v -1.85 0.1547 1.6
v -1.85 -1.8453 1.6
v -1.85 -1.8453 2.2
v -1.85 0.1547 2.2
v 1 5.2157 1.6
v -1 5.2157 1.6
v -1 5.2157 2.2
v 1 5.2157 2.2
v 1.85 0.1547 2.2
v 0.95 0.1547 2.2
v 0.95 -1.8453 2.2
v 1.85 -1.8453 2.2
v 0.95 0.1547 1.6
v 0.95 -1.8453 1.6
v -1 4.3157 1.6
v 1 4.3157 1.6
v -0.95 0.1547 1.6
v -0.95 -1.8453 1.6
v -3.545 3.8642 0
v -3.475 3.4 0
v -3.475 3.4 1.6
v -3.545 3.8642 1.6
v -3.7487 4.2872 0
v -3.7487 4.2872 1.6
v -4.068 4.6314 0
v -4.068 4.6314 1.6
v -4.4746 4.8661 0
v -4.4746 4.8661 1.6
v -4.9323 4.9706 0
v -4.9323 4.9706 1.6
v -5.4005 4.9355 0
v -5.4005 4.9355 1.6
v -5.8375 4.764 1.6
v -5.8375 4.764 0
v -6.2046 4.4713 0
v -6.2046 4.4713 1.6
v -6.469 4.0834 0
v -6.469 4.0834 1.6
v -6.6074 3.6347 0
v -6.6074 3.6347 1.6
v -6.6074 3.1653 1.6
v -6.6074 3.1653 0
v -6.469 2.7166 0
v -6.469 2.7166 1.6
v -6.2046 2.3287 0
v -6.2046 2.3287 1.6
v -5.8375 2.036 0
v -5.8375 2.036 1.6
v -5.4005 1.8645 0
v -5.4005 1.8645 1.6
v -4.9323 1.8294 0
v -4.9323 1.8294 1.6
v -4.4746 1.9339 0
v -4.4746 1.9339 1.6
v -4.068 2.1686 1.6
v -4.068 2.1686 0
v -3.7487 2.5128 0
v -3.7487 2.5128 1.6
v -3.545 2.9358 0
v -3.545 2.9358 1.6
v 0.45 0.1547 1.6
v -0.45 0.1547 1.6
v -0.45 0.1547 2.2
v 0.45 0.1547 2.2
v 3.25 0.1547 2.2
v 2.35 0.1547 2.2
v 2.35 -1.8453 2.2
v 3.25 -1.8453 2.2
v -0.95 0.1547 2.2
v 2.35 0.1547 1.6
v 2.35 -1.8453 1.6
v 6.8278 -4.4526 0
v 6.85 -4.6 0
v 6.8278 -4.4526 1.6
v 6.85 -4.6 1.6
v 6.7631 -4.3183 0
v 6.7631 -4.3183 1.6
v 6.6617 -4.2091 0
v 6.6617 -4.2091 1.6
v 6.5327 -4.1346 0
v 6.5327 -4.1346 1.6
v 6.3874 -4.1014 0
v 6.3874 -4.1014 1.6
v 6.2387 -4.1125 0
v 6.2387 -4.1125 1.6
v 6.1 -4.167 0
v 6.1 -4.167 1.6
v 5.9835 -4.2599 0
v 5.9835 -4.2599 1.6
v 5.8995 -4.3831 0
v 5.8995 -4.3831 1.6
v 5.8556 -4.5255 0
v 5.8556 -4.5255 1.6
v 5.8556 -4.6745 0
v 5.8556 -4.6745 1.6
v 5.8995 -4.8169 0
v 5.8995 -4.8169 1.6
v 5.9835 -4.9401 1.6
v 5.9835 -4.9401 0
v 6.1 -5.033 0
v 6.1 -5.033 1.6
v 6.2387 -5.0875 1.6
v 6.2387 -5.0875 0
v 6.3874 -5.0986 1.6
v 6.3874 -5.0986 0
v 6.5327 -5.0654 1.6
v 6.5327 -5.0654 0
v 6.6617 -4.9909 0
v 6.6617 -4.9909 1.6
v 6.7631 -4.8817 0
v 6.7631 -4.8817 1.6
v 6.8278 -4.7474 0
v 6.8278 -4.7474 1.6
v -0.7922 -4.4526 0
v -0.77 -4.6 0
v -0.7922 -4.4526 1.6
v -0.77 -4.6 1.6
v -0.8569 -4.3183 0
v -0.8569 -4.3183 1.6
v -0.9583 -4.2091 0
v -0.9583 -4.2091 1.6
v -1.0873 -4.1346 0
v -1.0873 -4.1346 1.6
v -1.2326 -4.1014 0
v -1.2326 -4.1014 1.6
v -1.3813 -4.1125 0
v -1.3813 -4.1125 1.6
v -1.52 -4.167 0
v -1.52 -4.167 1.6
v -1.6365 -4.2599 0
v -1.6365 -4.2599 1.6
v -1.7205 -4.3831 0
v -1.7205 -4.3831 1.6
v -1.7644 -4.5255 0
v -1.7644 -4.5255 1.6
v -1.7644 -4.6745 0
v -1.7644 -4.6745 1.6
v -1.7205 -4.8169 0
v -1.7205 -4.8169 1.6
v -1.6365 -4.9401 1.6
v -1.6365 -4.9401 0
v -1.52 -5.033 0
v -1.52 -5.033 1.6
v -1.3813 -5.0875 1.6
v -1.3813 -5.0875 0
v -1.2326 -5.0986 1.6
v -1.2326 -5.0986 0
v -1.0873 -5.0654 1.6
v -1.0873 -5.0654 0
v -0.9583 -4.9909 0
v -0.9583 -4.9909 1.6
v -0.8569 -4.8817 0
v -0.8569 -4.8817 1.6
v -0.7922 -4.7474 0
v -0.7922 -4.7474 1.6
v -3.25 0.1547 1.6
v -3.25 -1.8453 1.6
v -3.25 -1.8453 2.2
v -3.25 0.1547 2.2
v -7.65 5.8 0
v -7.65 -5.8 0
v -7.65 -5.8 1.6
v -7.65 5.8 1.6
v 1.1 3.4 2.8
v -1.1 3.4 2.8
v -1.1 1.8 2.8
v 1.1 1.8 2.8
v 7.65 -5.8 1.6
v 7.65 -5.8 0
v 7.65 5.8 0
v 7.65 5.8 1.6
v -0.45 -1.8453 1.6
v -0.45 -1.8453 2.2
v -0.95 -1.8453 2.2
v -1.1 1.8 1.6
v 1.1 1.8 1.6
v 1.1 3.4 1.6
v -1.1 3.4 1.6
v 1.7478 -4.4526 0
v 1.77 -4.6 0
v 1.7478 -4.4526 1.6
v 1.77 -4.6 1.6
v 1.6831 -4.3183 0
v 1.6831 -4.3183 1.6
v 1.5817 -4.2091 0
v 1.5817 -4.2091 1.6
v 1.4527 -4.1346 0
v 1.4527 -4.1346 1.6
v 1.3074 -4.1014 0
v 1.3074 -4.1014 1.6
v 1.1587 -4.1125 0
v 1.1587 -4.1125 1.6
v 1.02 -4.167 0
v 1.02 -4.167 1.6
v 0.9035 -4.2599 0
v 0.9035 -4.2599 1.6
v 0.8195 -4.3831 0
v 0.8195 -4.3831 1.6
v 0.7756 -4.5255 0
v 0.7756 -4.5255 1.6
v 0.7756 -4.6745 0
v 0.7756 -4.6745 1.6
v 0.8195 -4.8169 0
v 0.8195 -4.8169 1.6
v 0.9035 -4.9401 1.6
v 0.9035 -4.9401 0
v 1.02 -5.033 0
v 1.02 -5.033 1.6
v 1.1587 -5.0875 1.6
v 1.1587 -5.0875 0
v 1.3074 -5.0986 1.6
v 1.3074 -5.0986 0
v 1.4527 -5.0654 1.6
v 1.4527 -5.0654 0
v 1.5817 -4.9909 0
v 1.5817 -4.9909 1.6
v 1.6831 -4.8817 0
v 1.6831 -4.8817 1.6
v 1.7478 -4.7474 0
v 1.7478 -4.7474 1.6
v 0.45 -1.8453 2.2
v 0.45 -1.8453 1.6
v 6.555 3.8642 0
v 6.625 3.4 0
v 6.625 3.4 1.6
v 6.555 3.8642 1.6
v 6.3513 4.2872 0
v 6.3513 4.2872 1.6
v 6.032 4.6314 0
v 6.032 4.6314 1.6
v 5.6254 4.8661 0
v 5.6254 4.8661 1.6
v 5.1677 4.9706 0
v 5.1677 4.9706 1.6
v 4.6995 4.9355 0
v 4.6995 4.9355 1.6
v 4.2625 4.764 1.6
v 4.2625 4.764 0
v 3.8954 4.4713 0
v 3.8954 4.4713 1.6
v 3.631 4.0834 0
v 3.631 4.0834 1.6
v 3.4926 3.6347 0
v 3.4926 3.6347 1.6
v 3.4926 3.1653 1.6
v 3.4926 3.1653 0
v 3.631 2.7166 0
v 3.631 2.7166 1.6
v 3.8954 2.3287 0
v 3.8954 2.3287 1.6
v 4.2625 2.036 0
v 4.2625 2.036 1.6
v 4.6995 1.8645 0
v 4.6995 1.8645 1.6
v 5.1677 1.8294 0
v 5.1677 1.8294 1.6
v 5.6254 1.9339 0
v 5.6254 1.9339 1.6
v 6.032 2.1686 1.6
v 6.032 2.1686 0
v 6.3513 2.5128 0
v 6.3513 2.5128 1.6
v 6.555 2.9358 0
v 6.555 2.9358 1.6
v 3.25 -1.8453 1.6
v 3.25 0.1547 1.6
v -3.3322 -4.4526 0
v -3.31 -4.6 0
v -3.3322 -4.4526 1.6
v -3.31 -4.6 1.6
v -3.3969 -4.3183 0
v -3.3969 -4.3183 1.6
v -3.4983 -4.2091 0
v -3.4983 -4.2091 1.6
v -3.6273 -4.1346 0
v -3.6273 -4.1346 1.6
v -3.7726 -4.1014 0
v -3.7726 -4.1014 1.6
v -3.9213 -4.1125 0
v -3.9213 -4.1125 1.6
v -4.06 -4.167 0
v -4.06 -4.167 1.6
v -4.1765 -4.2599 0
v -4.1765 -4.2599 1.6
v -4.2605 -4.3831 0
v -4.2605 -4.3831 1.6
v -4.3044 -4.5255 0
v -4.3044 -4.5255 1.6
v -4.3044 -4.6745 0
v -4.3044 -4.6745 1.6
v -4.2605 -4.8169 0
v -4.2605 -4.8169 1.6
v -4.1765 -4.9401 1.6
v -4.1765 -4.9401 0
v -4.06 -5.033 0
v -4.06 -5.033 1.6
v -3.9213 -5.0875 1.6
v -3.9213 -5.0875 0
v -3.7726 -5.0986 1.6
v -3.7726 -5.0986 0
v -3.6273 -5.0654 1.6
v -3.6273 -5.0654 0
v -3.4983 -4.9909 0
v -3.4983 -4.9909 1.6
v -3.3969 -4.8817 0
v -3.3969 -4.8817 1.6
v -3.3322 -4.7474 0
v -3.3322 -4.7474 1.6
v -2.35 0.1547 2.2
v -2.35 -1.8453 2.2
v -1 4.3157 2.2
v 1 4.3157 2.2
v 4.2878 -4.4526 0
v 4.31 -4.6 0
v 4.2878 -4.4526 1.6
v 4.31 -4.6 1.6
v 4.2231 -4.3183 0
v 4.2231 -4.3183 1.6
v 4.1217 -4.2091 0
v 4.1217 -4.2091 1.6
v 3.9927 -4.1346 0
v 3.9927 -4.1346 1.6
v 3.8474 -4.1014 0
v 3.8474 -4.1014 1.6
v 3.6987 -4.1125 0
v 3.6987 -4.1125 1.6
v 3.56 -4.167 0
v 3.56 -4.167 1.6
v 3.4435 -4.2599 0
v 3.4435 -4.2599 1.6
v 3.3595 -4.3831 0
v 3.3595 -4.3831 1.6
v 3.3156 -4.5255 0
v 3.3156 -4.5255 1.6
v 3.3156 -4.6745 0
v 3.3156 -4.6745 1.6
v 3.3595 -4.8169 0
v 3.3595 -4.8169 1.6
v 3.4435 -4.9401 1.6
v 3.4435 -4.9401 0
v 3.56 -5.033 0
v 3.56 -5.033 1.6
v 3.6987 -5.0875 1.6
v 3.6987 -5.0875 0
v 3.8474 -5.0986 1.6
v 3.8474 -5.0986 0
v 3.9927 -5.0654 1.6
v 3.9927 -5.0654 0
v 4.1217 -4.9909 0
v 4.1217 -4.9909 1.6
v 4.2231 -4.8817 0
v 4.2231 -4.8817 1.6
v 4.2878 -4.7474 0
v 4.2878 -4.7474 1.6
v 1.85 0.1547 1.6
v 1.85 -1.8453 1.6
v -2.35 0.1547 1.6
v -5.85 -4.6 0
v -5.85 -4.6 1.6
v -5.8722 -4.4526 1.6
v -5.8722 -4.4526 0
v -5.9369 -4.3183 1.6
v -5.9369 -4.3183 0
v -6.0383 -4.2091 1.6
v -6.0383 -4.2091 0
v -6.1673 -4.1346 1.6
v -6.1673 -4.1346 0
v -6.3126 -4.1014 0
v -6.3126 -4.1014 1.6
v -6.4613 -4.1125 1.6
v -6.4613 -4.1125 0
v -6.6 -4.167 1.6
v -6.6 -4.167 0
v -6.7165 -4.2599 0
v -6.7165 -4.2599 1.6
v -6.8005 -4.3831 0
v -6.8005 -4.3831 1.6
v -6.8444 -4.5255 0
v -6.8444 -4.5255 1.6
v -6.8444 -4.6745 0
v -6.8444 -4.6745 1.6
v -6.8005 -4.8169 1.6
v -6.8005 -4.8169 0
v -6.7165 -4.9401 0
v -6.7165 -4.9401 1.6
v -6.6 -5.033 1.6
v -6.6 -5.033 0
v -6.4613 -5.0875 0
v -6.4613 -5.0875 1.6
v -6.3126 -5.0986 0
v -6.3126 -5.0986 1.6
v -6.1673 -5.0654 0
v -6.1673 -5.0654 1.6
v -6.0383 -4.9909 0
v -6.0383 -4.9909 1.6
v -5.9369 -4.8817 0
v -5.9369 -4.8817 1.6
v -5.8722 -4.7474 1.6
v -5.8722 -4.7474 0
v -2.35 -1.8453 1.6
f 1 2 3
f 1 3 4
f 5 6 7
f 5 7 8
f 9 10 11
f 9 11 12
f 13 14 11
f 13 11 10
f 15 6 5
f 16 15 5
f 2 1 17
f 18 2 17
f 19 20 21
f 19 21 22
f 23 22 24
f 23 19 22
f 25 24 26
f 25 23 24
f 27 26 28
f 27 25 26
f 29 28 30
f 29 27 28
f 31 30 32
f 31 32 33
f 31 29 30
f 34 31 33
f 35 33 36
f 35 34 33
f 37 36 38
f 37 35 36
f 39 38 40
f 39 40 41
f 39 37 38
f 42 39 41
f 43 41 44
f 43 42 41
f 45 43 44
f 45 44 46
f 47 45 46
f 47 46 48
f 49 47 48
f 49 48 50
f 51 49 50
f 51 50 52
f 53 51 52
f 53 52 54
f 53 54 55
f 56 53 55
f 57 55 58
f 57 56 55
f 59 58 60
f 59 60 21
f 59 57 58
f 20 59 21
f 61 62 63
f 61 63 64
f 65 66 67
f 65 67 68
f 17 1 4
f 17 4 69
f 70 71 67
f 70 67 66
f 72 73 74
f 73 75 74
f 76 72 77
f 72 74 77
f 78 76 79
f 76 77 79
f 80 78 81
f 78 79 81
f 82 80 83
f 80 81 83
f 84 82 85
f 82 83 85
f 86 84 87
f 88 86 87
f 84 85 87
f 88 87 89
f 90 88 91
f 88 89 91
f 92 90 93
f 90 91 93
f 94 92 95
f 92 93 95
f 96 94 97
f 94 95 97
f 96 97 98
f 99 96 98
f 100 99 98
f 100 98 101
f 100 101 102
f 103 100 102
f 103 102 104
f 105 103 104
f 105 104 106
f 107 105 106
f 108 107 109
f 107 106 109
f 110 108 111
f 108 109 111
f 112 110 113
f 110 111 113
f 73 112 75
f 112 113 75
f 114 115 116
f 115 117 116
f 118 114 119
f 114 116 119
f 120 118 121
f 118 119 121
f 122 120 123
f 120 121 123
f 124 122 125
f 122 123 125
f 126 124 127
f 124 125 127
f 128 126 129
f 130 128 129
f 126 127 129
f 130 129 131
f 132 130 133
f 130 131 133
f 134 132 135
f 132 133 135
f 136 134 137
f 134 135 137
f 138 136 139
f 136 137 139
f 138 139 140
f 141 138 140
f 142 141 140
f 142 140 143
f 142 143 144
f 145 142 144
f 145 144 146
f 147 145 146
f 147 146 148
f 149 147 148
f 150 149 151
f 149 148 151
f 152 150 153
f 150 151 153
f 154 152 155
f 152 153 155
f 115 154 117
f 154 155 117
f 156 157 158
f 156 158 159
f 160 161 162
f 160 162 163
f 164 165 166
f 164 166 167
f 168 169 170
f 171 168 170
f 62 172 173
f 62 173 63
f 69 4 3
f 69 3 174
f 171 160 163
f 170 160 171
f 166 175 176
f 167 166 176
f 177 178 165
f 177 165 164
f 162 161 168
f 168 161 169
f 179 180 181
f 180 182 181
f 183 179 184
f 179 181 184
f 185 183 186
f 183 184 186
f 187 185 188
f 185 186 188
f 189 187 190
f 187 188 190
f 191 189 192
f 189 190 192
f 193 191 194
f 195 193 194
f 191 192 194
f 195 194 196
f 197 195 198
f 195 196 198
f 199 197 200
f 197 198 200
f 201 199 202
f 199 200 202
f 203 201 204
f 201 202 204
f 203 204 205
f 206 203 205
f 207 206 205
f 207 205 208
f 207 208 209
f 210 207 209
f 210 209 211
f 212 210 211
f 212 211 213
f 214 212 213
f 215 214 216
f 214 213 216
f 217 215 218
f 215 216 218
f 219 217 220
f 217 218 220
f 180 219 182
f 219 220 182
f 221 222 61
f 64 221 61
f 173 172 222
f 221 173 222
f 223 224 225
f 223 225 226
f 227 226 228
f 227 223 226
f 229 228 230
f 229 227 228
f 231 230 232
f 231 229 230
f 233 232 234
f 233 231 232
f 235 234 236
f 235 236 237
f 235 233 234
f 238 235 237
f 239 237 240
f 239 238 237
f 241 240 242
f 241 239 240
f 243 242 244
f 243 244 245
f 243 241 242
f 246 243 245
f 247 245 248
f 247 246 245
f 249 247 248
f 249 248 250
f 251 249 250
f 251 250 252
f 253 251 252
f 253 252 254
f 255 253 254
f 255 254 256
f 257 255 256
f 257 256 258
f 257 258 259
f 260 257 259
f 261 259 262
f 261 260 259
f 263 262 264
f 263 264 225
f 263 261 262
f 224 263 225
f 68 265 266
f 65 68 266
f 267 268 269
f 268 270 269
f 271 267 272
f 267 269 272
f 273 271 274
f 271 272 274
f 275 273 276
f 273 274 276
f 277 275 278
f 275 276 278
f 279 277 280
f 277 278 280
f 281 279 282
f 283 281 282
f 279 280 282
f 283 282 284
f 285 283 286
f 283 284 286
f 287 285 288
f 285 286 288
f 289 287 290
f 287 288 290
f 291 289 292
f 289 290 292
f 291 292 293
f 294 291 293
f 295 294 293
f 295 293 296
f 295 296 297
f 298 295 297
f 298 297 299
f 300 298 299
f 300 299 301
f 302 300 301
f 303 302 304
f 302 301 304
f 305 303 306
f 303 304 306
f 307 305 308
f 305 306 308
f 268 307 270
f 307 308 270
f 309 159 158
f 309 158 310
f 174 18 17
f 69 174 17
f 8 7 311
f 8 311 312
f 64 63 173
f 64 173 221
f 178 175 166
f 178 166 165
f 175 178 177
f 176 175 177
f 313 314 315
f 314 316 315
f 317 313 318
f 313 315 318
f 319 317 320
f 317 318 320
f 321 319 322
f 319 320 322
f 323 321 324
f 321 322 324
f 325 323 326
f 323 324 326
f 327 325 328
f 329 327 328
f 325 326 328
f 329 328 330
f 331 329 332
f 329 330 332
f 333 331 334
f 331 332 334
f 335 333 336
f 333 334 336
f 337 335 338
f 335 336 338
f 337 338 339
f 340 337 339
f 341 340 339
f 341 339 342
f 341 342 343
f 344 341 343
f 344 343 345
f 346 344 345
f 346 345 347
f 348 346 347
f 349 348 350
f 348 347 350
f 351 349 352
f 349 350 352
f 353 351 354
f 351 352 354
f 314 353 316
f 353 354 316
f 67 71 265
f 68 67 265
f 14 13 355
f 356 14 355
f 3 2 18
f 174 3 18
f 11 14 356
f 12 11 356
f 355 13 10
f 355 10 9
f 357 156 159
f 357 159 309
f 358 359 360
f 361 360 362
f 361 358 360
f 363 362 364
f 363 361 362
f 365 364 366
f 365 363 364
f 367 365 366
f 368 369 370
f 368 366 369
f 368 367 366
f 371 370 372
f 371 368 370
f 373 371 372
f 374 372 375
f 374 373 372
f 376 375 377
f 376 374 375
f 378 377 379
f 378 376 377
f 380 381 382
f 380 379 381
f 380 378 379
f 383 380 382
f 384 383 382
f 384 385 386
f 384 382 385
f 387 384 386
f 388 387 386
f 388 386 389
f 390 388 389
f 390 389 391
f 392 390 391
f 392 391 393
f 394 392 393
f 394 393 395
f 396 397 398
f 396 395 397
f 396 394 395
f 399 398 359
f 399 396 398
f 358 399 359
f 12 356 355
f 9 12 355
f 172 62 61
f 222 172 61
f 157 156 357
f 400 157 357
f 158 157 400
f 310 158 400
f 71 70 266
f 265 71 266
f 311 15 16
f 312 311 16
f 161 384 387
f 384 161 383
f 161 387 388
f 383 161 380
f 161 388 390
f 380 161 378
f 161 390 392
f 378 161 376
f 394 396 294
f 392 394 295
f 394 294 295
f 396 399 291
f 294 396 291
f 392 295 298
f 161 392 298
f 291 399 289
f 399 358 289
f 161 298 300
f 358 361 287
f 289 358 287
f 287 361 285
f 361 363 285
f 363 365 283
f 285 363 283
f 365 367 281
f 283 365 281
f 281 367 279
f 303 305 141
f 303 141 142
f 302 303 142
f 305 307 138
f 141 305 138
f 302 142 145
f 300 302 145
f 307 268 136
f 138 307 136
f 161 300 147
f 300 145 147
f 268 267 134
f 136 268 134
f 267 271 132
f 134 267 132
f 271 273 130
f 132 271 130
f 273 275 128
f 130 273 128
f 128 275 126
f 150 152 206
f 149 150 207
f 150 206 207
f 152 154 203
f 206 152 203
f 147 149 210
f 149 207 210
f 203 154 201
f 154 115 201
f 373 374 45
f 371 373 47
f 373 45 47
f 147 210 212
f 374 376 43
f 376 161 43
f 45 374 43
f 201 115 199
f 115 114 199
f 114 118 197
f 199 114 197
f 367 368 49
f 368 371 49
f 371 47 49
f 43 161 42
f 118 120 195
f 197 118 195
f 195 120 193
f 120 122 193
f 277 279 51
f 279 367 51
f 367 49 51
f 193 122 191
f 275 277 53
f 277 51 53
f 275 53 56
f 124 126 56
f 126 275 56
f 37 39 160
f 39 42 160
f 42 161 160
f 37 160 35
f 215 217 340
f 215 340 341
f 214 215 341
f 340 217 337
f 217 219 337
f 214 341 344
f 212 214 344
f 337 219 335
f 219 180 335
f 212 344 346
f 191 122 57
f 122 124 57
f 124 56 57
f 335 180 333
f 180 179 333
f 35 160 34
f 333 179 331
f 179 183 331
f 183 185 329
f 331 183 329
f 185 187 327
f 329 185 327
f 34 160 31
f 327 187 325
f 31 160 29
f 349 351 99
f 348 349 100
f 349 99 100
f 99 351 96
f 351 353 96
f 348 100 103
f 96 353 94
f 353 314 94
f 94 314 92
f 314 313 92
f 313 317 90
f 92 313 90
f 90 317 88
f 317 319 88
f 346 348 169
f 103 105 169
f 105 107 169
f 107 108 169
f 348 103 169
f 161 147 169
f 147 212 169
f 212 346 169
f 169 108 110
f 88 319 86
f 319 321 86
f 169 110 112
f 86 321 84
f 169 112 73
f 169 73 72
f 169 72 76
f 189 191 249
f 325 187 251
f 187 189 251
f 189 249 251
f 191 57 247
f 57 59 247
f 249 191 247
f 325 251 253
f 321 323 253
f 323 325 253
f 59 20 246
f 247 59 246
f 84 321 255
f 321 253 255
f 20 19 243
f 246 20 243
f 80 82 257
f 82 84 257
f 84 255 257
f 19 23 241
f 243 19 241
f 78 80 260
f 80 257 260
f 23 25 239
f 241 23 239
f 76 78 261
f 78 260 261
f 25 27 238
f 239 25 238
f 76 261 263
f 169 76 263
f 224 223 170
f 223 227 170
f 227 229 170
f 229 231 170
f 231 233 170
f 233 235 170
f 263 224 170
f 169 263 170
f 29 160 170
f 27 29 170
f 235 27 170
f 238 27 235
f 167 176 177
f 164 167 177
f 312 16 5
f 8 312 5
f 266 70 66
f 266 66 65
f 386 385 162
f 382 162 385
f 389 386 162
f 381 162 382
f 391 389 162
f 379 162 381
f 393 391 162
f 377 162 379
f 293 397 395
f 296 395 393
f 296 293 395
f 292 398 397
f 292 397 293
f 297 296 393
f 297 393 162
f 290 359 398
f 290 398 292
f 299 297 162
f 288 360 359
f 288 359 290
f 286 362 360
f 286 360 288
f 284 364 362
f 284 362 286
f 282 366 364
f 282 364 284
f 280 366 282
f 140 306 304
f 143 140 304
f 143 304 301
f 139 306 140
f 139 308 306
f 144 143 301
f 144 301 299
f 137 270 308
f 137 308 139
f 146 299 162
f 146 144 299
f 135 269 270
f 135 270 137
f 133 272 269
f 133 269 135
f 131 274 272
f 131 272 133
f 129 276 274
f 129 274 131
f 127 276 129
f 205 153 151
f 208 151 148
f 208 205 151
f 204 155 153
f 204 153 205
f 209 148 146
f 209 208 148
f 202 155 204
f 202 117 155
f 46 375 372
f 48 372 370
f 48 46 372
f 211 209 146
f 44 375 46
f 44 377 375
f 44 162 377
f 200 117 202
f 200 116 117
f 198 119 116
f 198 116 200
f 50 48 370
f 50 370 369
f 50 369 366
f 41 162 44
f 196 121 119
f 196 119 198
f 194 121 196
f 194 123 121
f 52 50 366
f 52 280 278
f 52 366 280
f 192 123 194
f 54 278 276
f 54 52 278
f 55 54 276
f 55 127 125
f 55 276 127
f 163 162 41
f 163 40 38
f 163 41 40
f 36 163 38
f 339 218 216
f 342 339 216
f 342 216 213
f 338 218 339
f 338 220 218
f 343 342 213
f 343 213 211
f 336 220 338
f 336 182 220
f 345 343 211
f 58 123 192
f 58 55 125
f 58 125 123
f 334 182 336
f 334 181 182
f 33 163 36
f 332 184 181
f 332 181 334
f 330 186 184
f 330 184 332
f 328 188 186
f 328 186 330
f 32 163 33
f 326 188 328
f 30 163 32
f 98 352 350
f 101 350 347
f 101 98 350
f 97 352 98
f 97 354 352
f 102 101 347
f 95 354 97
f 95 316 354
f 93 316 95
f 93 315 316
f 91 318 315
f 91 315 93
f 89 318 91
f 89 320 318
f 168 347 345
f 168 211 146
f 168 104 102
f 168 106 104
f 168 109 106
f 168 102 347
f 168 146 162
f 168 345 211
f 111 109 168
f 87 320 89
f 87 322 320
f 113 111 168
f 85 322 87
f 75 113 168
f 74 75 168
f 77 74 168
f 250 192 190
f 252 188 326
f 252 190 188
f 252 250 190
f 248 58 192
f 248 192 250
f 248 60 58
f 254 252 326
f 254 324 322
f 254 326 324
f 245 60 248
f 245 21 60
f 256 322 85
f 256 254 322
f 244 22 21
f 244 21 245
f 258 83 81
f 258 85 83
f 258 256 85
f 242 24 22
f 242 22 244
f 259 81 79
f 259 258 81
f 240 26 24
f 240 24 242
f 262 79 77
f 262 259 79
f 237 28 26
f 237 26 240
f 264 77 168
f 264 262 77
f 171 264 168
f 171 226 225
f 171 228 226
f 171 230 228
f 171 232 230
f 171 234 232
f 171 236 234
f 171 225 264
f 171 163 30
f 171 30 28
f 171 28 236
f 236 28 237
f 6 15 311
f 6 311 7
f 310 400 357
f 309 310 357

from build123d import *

# Parameters (mm, degrees)
SKETCH_W            = 15.3
SKETCH_H            = 11.6
SKETCH_R            = 1.575
PAD_DEPTH           = 1.6
SKETCH001_R         = 0.5
POCKET_DEPTH        = 0.001
POCKET_DEPTH_BACK   = 1.601
LINEARPATTERN_COUNT = 6
LINEARPATTERN_PITCH = 2.54
SKETCH004_W         = 2.2
SKETCH004_H         = 1.6
PAD002_DEPTH        = 1.2
SKETCH005_W         = 2
SKETCH005_H         = 0.9
PAD003_DEPTH        = 0.6
SKETCH008_W         = 0.9
SKETCH008_H         = 2
PAD006_DEPTH        = 0.6
SKETCH009_W         = 0.9
SKETCH009_H         = 2
PAD007_DEPTH        = 0.6
SKETCH010_W         = 0.9
SKETCH010_H         = 2
PAD008_DEPTH        = 0.6
SKETCH011_W         = 0.9
SKETCH011_H         = 2
PAD009_DEPTH        = 0.6
SKETCH012_W         = 0.9
SKETCH012_H         = 2
PAD010_DEPTH        = 0.6


with BuildPart() as pcb:
    # Sketch → Pad (new body)
    with BuildSketch(Plane.XY):
        Rectangle(SKETCH_W, SKETCH_H)
        with Locations((-5.05, 3.4)):
            Circle(SKETCH_R, mode=Mode.SUBTRACT)
        with Locations((5.05, 3.4)):
            Circle(SKETCH_R, mode=Mode.SUBTRACT)
    extrude(amount=PAD_DEPTH)

    # Sketch001 → Pocket (cut, two sides)
    with BuildSketch(Plane.XY) as pocket_sk:
        with Locations((-6.35, -4.6)):
            Circle(SKETCH001_R)
    pocket = extrude(amount=-POCKET_DEPTH, mode=Mode.SUBTRACT) + extrude(pocket_sk.sketch, amount=POCKET_DEPTH_BACK, mode=Mode.SUBTRACT)

    # LinearPattern: Pocket ×6
    with Locations(*[(i * LINEARPATTERN_PITCH, 0, 0) for i in range(1, LINEARPATTERN_COUNT)]):
        add(pocket, mode=Mode.SUBTRACT)


with BuildPart() as bmp280_component:
    # Sketch004 → Pad002 (new body)
    with BuildSketch(Plane.XY.offset(1.6)):
        with Locations((0, 2.6)):
            Rectangle(SKETCH004_W, SKETCH004_H)
    extrude(amount=PAD002_DEPTH)


with BuildPart() as resistor1:
    # Sketch005 → Pad003 (new body)
    with BuildSketch(Plane.XY.offset(1.6)):
        with Locations((0, 4.765736)):
            Rectangle(SKETCH005_W, SKETCH005_H)
    extrude(amount=PAD003_DEPTH)


with BuildPart() as resistor2:
    # Sketch008 → Pad006 (new body)
    with BuildSketch(Plane.XY.offset(1.6)):
        with Locations((-2.8, -0.84528)):
            Rectangle(SKETCH008_W, SKETCH008_H)
    extrude(amount=PAD006_DEPTH)


with BuildPart() as resistor3:
    # Sketch009 → Pad007 (new body)
    with BuildSketch(Plane.XY.offset(1.6)):
        with Locations((-1.4, -0.84528)):
            Rectangle(SKETCH009_W, SKETCH009_H)
    extrude(amount=PAD007_DEPTH)


with BuildPart() as resistor4:
    # Sketch010 → Pad008 (new body)
    with BuildSketch(Plane.XY.offset(1.6)):
        with Locations((0, -0.84528)):
            Rectangle(SKETCH010_W, SKETCH010_H)
    extrude(amount=PAD008_DEPTH)


with BuildPart() as resistor5:
    # Sketch011 → Pad009 (new body)
    with BuildSketch(Plane.XY.offset(1.6)):
        with Locations((1.4, -0.84528)):
            Rectangle(SKETCH011_W, SKETCH011_H)
    extrude(amount=PAD009_DEPTH)


with BuildPart() as resistor6:
    # Sketch012 → Pad010 (new body)
    with BuildSketch(Plane.XY.offset(1.6)):
        with Locations((2.8, -0.84528)):
            Rectangle(SKETCH012_W, SKETCH012_H)
    extrude(amount=PAD010_DEPTH)


solid = Compound([pcb.part, bmp280_component.part, resistor1.part, resistor2.part, resistor3.part, resistor4.part, resistor5.part, resistor6.part])
